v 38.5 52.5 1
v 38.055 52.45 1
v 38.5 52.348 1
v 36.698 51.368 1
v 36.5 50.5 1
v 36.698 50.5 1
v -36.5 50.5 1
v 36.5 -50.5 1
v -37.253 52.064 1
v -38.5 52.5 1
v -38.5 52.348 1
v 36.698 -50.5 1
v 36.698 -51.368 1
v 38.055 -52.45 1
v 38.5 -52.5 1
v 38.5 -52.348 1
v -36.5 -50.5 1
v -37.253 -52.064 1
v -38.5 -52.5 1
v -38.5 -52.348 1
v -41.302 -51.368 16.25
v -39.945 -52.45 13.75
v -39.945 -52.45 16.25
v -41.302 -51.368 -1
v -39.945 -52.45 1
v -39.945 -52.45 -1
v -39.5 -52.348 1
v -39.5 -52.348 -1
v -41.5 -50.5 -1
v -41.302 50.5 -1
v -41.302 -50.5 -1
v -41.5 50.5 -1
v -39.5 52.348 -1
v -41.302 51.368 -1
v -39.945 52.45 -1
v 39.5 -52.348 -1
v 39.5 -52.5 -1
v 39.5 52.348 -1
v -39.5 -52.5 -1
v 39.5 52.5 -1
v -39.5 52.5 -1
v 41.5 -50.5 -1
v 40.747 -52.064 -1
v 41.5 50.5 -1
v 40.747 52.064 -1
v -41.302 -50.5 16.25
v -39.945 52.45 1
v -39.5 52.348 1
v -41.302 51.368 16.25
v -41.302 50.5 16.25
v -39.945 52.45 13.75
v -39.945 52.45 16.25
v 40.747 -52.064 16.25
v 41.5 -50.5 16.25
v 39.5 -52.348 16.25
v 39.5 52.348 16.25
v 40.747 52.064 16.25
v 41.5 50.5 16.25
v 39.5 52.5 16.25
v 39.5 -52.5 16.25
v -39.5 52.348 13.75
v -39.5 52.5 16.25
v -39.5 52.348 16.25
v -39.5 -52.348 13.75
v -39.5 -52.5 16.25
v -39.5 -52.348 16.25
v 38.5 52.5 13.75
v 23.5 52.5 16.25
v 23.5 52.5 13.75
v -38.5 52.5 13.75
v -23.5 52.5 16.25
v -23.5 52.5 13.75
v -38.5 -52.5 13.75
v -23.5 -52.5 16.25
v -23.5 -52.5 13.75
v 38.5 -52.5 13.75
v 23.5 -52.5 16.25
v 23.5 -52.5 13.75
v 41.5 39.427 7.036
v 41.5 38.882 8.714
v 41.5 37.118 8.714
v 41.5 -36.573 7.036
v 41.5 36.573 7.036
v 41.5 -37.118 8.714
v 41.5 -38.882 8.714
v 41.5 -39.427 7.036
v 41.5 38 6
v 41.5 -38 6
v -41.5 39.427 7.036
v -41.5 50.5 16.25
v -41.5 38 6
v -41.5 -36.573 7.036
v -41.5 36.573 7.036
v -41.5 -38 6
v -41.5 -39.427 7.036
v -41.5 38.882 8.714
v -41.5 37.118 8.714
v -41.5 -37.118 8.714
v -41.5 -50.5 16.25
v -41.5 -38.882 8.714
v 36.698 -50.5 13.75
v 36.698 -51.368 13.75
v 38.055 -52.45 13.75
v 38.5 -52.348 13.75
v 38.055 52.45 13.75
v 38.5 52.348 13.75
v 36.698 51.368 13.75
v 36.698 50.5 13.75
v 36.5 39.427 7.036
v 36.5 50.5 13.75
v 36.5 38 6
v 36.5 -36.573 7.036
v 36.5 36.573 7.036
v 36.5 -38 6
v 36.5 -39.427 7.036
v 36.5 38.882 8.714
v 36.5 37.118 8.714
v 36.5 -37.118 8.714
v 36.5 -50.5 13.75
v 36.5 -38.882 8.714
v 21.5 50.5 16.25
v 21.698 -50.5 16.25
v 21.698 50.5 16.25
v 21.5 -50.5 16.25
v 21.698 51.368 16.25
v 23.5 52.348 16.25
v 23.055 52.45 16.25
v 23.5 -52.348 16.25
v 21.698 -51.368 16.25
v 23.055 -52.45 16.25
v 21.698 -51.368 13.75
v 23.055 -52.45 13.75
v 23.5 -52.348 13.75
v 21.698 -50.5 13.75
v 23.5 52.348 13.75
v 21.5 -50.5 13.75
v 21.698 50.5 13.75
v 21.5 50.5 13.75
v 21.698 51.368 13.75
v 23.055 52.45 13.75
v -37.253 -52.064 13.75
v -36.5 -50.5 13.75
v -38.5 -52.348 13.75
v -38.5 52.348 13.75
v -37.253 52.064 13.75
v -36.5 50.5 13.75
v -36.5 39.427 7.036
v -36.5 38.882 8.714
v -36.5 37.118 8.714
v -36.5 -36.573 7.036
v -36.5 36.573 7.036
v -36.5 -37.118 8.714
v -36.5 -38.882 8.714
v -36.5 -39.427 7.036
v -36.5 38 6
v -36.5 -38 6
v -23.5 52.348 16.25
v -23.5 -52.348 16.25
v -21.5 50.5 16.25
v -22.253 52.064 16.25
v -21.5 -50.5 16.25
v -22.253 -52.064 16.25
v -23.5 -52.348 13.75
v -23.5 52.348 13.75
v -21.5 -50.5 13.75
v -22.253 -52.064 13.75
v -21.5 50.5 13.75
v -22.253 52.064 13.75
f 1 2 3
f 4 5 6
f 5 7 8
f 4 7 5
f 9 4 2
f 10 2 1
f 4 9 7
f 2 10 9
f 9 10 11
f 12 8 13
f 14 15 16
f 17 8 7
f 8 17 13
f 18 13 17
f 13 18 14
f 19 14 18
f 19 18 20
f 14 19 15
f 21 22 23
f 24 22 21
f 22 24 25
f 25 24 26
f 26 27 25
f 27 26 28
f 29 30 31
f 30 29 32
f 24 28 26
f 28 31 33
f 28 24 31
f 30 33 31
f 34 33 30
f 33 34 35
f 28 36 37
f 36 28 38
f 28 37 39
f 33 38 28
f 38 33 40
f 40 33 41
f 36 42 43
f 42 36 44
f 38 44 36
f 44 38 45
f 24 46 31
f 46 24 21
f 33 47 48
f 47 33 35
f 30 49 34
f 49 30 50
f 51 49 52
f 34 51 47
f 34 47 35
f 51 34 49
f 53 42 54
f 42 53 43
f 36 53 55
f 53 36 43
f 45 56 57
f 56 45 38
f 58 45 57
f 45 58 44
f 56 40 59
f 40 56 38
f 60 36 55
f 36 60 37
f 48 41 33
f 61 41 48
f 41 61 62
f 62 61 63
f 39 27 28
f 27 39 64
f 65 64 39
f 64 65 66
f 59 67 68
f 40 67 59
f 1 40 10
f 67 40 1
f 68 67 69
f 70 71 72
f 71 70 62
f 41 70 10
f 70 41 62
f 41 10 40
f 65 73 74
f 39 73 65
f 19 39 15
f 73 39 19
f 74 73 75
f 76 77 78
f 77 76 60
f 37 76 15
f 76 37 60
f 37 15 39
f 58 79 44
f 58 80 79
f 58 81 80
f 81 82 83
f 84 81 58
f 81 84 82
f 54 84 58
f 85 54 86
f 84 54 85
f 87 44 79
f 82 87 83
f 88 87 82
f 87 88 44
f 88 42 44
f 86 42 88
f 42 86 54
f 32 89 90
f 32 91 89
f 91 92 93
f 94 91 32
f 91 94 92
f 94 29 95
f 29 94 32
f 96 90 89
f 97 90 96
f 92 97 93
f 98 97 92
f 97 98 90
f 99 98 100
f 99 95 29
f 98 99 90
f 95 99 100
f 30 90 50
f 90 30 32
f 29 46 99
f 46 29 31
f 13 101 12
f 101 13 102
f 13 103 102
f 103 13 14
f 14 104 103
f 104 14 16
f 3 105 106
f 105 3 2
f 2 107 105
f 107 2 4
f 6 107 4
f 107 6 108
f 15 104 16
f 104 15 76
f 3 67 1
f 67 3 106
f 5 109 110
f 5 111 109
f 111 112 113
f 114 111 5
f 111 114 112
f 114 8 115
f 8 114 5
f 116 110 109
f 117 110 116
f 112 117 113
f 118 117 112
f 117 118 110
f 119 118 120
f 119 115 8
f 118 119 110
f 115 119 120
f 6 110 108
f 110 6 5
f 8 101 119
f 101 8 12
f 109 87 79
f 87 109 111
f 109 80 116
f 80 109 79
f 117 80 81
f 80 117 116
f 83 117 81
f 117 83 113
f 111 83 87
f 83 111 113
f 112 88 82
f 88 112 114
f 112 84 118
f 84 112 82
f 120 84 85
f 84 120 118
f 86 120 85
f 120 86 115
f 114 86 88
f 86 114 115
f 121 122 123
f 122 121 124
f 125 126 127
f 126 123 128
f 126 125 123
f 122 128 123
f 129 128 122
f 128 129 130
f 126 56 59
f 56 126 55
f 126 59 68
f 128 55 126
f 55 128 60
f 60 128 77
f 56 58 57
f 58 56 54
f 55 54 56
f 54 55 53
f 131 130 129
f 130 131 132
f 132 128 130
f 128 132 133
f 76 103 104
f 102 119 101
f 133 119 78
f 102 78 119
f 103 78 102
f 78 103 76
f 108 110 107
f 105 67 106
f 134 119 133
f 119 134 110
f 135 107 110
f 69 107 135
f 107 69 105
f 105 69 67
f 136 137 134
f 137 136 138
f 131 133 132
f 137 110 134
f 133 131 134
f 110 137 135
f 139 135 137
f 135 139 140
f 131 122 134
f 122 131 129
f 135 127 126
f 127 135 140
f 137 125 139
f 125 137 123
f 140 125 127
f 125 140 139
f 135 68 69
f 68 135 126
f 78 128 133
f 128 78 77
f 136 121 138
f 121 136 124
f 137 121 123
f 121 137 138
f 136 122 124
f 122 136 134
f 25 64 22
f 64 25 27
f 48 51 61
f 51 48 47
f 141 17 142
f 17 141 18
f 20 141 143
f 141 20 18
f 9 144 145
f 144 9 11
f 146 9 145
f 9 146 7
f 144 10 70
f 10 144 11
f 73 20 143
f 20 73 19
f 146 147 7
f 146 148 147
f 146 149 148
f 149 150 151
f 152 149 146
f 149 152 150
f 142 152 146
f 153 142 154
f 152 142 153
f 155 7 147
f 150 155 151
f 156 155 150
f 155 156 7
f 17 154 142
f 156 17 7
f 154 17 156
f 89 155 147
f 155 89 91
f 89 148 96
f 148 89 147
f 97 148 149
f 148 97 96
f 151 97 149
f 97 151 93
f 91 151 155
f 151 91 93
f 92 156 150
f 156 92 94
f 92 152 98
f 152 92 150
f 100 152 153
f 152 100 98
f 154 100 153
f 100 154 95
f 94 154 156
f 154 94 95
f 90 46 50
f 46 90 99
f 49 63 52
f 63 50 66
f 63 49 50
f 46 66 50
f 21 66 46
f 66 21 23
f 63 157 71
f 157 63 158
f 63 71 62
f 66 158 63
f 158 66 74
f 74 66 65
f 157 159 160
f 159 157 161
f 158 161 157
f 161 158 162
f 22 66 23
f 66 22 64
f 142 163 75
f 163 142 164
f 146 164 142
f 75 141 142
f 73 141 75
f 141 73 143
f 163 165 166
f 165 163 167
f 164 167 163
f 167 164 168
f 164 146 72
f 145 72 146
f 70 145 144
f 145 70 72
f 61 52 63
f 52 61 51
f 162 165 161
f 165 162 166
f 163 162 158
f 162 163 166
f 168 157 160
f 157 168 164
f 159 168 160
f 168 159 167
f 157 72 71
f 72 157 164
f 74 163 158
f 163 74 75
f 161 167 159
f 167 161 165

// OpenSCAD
use <MCAD/boxes.scad>

/* HDD stand base */
width=73;
length=105;
screw_dist=76;
thickness=5;
drill_rad=1.5;
base_thickness=2;
height=15;

module side(drill_dist, r,p)
{
	union() {
  	   difference() {
 	   roundedBox([thickness, length, height], 2, true);	
	   translate([0,drill_dist/2,0]) rotate([0,90,0]) cylinder(15,r,r, center=true);
	   translate([0,-drill_dist/2,0]) rotate([0,90,0]) cylinder(15,r,r, center=true);
	 }
 	    translate([p*thickness*3/2,0,height/2]) roundedBox([thickness*4, length, thickness/2], 2, true);	
	}

}

union() {
 roundedBox([width+thickness*2, length, base_thickness], 2, true);
 translate([(width+thickness)/2,0,height/2]) side(screw_dist,drill_rad, -1);
 translate([-(width+thickness)/2,0,height/2]) side(screw_dist, drill_rad, 1);

}
